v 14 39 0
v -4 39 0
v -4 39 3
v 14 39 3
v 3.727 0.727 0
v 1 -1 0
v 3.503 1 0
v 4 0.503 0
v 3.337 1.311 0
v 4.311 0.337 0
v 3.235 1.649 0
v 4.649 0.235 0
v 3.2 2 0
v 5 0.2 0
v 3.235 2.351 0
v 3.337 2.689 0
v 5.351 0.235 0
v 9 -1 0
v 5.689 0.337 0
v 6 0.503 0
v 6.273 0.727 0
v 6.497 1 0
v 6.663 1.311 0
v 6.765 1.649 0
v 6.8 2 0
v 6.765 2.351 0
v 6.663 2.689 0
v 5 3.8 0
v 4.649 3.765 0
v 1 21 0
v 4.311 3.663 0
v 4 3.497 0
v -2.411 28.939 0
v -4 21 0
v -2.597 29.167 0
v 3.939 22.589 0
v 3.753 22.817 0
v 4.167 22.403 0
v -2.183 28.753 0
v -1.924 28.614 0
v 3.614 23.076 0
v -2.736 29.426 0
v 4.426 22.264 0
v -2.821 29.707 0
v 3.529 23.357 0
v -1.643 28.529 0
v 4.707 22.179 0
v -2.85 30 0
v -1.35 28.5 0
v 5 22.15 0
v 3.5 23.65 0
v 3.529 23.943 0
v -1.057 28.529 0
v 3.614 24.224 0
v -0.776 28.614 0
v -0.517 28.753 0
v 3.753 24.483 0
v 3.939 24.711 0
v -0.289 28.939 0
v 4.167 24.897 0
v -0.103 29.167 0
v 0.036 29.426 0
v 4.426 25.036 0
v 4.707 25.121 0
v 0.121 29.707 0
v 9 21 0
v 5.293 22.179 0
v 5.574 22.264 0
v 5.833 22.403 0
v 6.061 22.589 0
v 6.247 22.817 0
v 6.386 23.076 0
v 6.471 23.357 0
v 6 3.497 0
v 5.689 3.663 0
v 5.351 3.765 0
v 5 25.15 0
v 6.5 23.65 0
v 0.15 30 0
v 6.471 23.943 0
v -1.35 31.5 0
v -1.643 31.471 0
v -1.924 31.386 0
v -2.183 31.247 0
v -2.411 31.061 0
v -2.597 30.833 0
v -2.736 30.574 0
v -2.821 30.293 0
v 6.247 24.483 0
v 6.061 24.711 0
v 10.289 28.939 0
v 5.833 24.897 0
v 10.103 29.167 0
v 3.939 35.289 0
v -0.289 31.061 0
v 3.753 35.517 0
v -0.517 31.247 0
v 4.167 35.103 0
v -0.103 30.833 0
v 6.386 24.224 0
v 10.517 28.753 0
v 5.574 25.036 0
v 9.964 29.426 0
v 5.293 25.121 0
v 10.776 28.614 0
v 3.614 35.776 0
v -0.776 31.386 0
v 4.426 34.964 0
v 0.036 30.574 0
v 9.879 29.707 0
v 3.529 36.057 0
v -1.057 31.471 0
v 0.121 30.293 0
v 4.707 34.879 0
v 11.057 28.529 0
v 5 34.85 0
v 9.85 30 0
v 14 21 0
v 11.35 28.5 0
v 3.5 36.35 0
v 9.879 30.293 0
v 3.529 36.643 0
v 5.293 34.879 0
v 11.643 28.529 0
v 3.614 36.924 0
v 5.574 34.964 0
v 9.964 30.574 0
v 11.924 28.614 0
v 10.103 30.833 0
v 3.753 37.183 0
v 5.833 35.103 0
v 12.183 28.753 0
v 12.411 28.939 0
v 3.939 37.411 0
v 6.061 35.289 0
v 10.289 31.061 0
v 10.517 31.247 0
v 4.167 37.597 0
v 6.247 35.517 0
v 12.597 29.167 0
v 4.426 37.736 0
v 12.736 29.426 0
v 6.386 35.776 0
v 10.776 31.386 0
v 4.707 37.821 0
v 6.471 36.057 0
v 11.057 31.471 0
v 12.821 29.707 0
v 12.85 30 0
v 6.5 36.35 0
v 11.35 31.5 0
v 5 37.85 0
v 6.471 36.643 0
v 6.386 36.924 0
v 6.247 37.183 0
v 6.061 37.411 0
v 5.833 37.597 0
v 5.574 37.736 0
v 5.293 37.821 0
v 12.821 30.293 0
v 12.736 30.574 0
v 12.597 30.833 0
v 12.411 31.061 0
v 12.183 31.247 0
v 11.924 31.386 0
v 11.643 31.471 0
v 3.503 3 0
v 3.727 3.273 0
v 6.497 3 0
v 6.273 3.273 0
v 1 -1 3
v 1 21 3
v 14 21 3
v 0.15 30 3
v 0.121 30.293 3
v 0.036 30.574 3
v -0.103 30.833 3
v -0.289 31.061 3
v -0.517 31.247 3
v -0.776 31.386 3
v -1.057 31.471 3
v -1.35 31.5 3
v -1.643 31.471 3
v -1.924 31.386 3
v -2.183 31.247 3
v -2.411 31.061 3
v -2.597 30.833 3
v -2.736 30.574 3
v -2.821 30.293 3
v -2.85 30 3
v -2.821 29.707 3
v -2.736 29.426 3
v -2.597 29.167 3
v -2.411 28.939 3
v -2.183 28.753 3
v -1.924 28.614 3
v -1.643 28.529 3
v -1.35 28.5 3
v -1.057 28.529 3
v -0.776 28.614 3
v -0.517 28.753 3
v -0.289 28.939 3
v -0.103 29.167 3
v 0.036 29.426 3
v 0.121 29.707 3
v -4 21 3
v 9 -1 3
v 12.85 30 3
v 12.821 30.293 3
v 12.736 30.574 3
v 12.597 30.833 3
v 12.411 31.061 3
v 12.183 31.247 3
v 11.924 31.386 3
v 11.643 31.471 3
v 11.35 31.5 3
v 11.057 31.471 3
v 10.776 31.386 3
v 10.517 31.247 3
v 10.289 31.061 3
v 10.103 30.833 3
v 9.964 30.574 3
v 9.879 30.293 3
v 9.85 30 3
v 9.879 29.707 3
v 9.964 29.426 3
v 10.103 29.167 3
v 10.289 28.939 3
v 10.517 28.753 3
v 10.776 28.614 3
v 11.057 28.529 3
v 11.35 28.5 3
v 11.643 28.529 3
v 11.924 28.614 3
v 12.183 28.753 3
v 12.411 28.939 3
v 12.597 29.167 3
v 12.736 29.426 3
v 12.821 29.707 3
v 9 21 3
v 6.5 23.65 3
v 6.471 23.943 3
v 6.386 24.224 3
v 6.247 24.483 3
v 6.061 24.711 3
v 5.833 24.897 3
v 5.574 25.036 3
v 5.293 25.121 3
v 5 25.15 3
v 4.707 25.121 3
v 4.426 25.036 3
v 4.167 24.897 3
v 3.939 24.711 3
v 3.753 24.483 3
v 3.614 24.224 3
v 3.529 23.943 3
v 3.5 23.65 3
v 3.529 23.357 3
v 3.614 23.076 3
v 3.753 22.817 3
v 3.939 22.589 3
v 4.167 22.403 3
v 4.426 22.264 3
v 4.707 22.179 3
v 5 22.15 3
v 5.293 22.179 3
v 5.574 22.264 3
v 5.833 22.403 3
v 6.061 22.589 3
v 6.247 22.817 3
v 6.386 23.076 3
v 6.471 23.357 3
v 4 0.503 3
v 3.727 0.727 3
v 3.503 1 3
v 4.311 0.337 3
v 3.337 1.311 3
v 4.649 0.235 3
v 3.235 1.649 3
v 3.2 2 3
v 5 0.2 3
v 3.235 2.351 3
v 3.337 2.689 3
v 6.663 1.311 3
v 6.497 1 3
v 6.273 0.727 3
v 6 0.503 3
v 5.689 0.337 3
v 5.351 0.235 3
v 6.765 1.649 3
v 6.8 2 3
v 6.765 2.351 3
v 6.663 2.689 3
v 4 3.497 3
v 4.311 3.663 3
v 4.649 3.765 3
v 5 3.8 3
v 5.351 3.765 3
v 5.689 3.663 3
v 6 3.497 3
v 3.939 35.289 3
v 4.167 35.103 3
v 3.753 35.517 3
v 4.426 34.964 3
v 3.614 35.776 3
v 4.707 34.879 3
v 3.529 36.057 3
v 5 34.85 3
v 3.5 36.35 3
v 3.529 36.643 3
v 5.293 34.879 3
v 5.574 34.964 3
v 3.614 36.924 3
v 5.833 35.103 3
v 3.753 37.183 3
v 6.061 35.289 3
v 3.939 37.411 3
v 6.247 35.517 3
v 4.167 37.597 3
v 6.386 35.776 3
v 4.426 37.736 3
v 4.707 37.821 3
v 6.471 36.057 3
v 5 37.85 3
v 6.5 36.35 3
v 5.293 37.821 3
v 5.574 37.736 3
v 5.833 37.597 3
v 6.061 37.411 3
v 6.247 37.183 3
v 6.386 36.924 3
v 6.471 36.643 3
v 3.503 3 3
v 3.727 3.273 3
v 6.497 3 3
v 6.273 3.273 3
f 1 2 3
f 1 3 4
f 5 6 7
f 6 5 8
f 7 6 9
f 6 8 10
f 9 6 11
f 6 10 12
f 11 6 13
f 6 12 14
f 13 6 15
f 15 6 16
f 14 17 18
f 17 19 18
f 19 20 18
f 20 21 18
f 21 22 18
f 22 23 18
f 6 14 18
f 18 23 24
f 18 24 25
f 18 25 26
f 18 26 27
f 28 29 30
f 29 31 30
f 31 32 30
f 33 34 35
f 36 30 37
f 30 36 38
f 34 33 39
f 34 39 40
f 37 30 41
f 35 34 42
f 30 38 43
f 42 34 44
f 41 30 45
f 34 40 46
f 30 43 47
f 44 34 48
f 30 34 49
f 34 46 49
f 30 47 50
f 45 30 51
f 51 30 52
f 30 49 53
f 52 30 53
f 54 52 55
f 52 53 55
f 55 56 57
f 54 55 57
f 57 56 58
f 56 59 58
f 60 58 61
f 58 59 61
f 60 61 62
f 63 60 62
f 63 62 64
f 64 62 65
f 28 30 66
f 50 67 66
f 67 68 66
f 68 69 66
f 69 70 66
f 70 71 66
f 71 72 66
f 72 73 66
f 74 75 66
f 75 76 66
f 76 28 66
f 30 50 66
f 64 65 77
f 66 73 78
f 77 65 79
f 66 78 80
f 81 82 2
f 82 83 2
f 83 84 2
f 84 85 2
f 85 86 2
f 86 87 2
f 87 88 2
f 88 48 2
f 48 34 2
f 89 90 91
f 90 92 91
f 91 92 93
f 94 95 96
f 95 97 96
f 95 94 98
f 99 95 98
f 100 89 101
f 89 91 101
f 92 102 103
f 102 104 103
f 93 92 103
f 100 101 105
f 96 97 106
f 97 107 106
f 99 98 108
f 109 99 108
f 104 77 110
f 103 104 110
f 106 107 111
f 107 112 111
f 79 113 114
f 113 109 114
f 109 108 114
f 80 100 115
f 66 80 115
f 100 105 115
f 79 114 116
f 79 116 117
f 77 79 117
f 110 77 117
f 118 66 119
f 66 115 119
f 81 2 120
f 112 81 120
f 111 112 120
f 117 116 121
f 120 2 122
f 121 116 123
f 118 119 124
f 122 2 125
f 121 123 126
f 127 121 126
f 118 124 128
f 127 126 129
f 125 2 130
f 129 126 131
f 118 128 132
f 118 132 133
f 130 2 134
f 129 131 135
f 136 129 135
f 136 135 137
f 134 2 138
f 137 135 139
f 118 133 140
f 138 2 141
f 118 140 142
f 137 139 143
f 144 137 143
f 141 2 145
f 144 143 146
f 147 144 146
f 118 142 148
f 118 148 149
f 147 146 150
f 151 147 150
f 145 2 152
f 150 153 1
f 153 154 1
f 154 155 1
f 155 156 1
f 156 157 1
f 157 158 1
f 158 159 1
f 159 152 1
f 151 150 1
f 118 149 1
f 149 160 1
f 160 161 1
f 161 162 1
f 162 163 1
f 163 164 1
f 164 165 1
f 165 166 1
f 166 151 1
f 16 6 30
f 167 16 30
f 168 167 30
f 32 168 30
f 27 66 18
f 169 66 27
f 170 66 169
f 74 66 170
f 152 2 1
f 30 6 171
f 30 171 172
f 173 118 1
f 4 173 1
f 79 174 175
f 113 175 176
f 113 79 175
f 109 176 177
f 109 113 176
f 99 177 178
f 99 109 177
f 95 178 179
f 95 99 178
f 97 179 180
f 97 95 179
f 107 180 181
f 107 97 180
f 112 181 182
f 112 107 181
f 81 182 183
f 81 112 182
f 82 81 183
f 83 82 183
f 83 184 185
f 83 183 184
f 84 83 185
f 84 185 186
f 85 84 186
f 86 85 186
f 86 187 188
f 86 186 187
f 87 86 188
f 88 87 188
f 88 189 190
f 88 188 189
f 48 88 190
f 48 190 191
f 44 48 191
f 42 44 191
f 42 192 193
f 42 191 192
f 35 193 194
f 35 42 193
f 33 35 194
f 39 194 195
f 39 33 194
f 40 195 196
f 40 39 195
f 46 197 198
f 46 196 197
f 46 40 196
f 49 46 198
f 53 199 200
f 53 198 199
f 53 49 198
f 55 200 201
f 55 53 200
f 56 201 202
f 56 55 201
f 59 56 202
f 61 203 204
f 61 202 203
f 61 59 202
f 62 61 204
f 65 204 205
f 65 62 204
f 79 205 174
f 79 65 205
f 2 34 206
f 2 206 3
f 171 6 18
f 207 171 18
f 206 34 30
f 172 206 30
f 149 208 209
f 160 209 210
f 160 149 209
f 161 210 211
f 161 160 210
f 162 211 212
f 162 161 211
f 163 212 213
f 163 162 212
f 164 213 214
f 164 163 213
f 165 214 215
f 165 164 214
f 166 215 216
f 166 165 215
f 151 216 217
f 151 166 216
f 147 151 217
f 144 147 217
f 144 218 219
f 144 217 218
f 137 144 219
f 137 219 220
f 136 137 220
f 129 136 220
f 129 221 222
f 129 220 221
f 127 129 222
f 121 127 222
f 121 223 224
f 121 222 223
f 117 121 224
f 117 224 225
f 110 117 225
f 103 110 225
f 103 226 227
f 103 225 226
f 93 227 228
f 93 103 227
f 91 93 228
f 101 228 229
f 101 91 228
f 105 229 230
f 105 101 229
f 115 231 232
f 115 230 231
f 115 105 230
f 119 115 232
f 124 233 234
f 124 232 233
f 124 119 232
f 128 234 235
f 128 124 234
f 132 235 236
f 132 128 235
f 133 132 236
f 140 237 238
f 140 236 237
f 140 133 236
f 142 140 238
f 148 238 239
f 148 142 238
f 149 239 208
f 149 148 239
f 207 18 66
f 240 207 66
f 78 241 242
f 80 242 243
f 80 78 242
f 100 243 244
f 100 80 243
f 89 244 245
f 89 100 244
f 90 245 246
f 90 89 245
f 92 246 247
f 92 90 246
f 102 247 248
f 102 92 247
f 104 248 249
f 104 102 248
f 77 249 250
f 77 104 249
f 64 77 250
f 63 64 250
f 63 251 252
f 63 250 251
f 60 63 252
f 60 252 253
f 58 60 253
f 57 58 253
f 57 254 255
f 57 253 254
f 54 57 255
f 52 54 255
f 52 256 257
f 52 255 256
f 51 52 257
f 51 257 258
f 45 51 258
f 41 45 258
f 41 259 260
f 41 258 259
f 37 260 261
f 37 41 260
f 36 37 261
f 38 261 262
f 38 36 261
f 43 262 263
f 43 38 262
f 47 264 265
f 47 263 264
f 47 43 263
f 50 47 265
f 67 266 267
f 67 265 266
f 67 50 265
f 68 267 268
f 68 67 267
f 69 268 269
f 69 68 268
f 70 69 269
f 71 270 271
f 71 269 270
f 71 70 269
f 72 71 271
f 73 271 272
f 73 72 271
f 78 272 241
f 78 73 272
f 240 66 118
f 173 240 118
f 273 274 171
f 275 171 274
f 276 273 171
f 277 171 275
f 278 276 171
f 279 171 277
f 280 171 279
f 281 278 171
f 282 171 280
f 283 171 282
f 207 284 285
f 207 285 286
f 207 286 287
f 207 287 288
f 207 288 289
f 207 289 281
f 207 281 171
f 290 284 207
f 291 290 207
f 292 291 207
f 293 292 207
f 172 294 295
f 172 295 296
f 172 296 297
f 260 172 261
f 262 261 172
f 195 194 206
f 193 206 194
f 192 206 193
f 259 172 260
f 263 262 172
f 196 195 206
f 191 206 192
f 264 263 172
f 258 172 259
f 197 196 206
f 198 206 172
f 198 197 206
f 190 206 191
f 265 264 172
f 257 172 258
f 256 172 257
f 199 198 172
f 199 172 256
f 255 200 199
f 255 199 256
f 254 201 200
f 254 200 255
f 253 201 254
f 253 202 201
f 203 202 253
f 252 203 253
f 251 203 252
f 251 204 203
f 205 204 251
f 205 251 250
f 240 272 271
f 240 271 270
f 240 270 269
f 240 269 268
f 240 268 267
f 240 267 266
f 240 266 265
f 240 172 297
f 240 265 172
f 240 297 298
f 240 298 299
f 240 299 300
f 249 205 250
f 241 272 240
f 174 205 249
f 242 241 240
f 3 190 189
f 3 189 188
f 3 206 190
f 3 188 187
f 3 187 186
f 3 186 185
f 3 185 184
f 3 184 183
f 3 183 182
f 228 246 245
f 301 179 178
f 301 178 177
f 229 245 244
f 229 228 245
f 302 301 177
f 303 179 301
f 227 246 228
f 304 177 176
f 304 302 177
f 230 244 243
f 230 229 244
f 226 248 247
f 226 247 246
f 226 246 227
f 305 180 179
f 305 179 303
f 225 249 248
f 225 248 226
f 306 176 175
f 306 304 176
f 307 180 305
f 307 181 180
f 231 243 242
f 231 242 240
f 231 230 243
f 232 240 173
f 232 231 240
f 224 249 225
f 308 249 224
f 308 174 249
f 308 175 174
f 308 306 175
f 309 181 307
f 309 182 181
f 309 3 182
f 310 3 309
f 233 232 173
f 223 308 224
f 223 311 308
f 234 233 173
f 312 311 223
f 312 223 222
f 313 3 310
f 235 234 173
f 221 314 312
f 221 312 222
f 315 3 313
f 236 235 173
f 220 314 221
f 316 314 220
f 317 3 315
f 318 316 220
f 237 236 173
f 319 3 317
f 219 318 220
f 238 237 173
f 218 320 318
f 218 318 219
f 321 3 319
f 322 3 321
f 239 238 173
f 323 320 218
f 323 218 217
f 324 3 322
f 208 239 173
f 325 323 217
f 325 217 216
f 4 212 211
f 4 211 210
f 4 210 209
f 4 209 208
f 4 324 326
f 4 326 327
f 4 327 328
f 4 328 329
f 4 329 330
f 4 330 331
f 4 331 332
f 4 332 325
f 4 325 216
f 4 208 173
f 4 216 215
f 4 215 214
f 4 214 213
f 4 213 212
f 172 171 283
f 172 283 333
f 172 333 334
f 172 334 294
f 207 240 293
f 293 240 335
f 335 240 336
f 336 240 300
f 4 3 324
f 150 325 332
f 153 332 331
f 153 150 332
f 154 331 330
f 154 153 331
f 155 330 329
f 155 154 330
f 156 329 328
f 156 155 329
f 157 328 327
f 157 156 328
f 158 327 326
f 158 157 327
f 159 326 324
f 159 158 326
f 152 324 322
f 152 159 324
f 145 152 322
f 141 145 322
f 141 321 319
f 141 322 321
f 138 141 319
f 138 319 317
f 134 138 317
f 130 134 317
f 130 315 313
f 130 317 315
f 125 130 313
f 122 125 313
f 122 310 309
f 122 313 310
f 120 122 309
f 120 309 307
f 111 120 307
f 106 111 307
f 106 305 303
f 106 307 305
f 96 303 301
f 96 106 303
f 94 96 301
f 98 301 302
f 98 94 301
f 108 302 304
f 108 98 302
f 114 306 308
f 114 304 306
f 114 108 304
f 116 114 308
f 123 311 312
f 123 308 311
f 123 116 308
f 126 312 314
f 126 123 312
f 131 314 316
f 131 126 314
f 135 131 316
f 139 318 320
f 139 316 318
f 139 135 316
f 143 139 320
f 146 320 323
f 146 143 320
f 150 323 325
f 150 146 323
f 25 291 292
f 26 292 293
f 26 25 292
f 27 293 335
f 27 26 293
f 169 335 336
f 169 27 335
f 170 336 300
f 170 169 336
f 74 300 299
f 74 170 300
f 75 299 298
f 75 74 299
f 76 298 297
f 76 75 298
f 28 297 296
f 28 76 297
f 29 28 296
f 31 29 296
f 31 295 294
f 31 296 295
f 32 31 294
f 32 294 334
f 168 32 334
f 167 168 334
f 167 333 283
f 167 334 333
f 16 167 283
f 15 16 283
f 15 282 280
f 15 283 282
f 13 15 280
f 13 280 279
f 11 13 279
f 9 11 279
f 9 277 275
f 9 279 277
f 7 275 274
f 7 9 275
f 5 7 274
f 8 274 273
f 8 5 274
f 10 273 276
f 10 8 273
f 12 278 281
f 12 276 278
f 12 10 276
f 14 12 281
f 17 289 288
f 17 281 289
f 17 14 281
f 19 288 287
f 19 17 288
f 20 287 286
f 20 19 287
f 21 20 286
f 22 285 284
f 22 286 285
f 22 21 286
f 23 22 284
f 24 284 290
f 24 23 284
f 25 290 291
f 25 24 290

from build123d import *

# Parameters (mm, degrees)
CYLINDER005_R     = 1.8
CYLINDER005_DEPTH = 10
BOX010_W          = 8
BOX010_H          = 22
BOX010_DEPTH      = 3
CYLINDER009_R     = 1.5
CYLINDER009_DEPTH = 10
CYLINDER008_R     = 1.5
CYLINDER008_DEPTH = 10
CYLINDER007_R     = 1.5
CYLINDER007_DEPTH = 10
CYLINDER006_R     = 1.5
CYLINDER006_DEPTH = 10
BOX009_W          = 18
BOX009_H          = 18
BOX009_DEPTH      = 3


with BuildPart() as cylinder005:
    # Cylinder005 → Cylinder005 (new body)
    with BuildSketch(Plane(origin=(5, 2, 0), x_dir=(1, 0, 0), z_dir=(0, 0, 1))):
        Circle(CYLINDER005_R)
    extrude(amount=CYLINDER005_DEPTH)


with BuildPart() as cut012:
    # Box010 → Box010 (new body)
    with BuildSketch(Plane(origin=(1, -1, 0), x_dir=(1, 0, 0), z_dir=(0, 0, 1))):
        with Locations((4, 11)):
            Rectangle(BOX010_W, BOX010_H)
    extrude(amount=BOX010_DEPTH)

    # Cut012: cut Cylinder005
    add(cylinder005.part, mode=Mode.SUBTRACT)


with BuildPart() as cylinder009:
    # Cylinder009 → Cylinder009 (new body)
    with BuildSketch(Plane(origin=(5, 23.65, 0), x_dir=(1, 0, 0), z_dir=(0, 0, 1))):
        Circle(CYLINDER009_R)
    extrude(amount=CYLINDER009_DEPTH)


with BuildPart() as cylinder008:
    # Cylinder008 → Cylinder008 (new body)
    with BuildSketch(Plane(origin=(-1.35, 30, 0), x_dir=(1, 0, 0), z_dir=(0, 0, 1))):
        Circle(CYLINDER008_R)
    extrude(amount=CYLINDER008_DEPTH)


with BuildPart() as cylinder007:
    # Cylinder007 → Cylinder007 (new body)
    with BuildSketch(Plane(origin=(11.35, 30, 0), x_dir=(1, 0, 0), z_dir=(0, 0, 1))):
        Circle(CYLINDER007_R)
    extrude(amount=CYLINDER007_DEPTH)


with BuildPart() as cylinder006:
    # Cylinder006 → Cylinder006 (new body)
    with BuildSketch(Plane(origin=(5, 36.35, 0), x_dir=(1, 0, 0), z_dir=(0, 0, 1))):
        Circle(CYLINDER006_R)
    extrude(amount=CYLINDER006_DEPTH)


with BuildPart() as slidemotorarmextension:
    # Box009 → Box009 (new body)
    with BuildSketch(Plane(origin=(-4, 21, 0), x_dir=(1, 0, 0), z_dir=(0, 0, 1))):
        with Locations((9, 9)):
            Rectangle(BOX009_W, BOX009_H)
    extrude(amount=BOX009_DEPTH)

    # Cut008: cut Cylinder006
    add(cylinder006.part, mode=Mode.SUBTRACT)

    # Cut009: cut Cylinder007
    add(cylinder007.part, mode=Mode.SUBTRACT)

    # Cut010: cut Cylinder008
    add(cylinder008.part, mode=Mode.SUBTRACT)

    # Cut011: cut Cylinder009
    add(cylinder009.part, mode=Mode.SUBTRACT)

    # Fusion002: union Cut012
    add(cut012.part)


solid = slidemotorarmextension.part
